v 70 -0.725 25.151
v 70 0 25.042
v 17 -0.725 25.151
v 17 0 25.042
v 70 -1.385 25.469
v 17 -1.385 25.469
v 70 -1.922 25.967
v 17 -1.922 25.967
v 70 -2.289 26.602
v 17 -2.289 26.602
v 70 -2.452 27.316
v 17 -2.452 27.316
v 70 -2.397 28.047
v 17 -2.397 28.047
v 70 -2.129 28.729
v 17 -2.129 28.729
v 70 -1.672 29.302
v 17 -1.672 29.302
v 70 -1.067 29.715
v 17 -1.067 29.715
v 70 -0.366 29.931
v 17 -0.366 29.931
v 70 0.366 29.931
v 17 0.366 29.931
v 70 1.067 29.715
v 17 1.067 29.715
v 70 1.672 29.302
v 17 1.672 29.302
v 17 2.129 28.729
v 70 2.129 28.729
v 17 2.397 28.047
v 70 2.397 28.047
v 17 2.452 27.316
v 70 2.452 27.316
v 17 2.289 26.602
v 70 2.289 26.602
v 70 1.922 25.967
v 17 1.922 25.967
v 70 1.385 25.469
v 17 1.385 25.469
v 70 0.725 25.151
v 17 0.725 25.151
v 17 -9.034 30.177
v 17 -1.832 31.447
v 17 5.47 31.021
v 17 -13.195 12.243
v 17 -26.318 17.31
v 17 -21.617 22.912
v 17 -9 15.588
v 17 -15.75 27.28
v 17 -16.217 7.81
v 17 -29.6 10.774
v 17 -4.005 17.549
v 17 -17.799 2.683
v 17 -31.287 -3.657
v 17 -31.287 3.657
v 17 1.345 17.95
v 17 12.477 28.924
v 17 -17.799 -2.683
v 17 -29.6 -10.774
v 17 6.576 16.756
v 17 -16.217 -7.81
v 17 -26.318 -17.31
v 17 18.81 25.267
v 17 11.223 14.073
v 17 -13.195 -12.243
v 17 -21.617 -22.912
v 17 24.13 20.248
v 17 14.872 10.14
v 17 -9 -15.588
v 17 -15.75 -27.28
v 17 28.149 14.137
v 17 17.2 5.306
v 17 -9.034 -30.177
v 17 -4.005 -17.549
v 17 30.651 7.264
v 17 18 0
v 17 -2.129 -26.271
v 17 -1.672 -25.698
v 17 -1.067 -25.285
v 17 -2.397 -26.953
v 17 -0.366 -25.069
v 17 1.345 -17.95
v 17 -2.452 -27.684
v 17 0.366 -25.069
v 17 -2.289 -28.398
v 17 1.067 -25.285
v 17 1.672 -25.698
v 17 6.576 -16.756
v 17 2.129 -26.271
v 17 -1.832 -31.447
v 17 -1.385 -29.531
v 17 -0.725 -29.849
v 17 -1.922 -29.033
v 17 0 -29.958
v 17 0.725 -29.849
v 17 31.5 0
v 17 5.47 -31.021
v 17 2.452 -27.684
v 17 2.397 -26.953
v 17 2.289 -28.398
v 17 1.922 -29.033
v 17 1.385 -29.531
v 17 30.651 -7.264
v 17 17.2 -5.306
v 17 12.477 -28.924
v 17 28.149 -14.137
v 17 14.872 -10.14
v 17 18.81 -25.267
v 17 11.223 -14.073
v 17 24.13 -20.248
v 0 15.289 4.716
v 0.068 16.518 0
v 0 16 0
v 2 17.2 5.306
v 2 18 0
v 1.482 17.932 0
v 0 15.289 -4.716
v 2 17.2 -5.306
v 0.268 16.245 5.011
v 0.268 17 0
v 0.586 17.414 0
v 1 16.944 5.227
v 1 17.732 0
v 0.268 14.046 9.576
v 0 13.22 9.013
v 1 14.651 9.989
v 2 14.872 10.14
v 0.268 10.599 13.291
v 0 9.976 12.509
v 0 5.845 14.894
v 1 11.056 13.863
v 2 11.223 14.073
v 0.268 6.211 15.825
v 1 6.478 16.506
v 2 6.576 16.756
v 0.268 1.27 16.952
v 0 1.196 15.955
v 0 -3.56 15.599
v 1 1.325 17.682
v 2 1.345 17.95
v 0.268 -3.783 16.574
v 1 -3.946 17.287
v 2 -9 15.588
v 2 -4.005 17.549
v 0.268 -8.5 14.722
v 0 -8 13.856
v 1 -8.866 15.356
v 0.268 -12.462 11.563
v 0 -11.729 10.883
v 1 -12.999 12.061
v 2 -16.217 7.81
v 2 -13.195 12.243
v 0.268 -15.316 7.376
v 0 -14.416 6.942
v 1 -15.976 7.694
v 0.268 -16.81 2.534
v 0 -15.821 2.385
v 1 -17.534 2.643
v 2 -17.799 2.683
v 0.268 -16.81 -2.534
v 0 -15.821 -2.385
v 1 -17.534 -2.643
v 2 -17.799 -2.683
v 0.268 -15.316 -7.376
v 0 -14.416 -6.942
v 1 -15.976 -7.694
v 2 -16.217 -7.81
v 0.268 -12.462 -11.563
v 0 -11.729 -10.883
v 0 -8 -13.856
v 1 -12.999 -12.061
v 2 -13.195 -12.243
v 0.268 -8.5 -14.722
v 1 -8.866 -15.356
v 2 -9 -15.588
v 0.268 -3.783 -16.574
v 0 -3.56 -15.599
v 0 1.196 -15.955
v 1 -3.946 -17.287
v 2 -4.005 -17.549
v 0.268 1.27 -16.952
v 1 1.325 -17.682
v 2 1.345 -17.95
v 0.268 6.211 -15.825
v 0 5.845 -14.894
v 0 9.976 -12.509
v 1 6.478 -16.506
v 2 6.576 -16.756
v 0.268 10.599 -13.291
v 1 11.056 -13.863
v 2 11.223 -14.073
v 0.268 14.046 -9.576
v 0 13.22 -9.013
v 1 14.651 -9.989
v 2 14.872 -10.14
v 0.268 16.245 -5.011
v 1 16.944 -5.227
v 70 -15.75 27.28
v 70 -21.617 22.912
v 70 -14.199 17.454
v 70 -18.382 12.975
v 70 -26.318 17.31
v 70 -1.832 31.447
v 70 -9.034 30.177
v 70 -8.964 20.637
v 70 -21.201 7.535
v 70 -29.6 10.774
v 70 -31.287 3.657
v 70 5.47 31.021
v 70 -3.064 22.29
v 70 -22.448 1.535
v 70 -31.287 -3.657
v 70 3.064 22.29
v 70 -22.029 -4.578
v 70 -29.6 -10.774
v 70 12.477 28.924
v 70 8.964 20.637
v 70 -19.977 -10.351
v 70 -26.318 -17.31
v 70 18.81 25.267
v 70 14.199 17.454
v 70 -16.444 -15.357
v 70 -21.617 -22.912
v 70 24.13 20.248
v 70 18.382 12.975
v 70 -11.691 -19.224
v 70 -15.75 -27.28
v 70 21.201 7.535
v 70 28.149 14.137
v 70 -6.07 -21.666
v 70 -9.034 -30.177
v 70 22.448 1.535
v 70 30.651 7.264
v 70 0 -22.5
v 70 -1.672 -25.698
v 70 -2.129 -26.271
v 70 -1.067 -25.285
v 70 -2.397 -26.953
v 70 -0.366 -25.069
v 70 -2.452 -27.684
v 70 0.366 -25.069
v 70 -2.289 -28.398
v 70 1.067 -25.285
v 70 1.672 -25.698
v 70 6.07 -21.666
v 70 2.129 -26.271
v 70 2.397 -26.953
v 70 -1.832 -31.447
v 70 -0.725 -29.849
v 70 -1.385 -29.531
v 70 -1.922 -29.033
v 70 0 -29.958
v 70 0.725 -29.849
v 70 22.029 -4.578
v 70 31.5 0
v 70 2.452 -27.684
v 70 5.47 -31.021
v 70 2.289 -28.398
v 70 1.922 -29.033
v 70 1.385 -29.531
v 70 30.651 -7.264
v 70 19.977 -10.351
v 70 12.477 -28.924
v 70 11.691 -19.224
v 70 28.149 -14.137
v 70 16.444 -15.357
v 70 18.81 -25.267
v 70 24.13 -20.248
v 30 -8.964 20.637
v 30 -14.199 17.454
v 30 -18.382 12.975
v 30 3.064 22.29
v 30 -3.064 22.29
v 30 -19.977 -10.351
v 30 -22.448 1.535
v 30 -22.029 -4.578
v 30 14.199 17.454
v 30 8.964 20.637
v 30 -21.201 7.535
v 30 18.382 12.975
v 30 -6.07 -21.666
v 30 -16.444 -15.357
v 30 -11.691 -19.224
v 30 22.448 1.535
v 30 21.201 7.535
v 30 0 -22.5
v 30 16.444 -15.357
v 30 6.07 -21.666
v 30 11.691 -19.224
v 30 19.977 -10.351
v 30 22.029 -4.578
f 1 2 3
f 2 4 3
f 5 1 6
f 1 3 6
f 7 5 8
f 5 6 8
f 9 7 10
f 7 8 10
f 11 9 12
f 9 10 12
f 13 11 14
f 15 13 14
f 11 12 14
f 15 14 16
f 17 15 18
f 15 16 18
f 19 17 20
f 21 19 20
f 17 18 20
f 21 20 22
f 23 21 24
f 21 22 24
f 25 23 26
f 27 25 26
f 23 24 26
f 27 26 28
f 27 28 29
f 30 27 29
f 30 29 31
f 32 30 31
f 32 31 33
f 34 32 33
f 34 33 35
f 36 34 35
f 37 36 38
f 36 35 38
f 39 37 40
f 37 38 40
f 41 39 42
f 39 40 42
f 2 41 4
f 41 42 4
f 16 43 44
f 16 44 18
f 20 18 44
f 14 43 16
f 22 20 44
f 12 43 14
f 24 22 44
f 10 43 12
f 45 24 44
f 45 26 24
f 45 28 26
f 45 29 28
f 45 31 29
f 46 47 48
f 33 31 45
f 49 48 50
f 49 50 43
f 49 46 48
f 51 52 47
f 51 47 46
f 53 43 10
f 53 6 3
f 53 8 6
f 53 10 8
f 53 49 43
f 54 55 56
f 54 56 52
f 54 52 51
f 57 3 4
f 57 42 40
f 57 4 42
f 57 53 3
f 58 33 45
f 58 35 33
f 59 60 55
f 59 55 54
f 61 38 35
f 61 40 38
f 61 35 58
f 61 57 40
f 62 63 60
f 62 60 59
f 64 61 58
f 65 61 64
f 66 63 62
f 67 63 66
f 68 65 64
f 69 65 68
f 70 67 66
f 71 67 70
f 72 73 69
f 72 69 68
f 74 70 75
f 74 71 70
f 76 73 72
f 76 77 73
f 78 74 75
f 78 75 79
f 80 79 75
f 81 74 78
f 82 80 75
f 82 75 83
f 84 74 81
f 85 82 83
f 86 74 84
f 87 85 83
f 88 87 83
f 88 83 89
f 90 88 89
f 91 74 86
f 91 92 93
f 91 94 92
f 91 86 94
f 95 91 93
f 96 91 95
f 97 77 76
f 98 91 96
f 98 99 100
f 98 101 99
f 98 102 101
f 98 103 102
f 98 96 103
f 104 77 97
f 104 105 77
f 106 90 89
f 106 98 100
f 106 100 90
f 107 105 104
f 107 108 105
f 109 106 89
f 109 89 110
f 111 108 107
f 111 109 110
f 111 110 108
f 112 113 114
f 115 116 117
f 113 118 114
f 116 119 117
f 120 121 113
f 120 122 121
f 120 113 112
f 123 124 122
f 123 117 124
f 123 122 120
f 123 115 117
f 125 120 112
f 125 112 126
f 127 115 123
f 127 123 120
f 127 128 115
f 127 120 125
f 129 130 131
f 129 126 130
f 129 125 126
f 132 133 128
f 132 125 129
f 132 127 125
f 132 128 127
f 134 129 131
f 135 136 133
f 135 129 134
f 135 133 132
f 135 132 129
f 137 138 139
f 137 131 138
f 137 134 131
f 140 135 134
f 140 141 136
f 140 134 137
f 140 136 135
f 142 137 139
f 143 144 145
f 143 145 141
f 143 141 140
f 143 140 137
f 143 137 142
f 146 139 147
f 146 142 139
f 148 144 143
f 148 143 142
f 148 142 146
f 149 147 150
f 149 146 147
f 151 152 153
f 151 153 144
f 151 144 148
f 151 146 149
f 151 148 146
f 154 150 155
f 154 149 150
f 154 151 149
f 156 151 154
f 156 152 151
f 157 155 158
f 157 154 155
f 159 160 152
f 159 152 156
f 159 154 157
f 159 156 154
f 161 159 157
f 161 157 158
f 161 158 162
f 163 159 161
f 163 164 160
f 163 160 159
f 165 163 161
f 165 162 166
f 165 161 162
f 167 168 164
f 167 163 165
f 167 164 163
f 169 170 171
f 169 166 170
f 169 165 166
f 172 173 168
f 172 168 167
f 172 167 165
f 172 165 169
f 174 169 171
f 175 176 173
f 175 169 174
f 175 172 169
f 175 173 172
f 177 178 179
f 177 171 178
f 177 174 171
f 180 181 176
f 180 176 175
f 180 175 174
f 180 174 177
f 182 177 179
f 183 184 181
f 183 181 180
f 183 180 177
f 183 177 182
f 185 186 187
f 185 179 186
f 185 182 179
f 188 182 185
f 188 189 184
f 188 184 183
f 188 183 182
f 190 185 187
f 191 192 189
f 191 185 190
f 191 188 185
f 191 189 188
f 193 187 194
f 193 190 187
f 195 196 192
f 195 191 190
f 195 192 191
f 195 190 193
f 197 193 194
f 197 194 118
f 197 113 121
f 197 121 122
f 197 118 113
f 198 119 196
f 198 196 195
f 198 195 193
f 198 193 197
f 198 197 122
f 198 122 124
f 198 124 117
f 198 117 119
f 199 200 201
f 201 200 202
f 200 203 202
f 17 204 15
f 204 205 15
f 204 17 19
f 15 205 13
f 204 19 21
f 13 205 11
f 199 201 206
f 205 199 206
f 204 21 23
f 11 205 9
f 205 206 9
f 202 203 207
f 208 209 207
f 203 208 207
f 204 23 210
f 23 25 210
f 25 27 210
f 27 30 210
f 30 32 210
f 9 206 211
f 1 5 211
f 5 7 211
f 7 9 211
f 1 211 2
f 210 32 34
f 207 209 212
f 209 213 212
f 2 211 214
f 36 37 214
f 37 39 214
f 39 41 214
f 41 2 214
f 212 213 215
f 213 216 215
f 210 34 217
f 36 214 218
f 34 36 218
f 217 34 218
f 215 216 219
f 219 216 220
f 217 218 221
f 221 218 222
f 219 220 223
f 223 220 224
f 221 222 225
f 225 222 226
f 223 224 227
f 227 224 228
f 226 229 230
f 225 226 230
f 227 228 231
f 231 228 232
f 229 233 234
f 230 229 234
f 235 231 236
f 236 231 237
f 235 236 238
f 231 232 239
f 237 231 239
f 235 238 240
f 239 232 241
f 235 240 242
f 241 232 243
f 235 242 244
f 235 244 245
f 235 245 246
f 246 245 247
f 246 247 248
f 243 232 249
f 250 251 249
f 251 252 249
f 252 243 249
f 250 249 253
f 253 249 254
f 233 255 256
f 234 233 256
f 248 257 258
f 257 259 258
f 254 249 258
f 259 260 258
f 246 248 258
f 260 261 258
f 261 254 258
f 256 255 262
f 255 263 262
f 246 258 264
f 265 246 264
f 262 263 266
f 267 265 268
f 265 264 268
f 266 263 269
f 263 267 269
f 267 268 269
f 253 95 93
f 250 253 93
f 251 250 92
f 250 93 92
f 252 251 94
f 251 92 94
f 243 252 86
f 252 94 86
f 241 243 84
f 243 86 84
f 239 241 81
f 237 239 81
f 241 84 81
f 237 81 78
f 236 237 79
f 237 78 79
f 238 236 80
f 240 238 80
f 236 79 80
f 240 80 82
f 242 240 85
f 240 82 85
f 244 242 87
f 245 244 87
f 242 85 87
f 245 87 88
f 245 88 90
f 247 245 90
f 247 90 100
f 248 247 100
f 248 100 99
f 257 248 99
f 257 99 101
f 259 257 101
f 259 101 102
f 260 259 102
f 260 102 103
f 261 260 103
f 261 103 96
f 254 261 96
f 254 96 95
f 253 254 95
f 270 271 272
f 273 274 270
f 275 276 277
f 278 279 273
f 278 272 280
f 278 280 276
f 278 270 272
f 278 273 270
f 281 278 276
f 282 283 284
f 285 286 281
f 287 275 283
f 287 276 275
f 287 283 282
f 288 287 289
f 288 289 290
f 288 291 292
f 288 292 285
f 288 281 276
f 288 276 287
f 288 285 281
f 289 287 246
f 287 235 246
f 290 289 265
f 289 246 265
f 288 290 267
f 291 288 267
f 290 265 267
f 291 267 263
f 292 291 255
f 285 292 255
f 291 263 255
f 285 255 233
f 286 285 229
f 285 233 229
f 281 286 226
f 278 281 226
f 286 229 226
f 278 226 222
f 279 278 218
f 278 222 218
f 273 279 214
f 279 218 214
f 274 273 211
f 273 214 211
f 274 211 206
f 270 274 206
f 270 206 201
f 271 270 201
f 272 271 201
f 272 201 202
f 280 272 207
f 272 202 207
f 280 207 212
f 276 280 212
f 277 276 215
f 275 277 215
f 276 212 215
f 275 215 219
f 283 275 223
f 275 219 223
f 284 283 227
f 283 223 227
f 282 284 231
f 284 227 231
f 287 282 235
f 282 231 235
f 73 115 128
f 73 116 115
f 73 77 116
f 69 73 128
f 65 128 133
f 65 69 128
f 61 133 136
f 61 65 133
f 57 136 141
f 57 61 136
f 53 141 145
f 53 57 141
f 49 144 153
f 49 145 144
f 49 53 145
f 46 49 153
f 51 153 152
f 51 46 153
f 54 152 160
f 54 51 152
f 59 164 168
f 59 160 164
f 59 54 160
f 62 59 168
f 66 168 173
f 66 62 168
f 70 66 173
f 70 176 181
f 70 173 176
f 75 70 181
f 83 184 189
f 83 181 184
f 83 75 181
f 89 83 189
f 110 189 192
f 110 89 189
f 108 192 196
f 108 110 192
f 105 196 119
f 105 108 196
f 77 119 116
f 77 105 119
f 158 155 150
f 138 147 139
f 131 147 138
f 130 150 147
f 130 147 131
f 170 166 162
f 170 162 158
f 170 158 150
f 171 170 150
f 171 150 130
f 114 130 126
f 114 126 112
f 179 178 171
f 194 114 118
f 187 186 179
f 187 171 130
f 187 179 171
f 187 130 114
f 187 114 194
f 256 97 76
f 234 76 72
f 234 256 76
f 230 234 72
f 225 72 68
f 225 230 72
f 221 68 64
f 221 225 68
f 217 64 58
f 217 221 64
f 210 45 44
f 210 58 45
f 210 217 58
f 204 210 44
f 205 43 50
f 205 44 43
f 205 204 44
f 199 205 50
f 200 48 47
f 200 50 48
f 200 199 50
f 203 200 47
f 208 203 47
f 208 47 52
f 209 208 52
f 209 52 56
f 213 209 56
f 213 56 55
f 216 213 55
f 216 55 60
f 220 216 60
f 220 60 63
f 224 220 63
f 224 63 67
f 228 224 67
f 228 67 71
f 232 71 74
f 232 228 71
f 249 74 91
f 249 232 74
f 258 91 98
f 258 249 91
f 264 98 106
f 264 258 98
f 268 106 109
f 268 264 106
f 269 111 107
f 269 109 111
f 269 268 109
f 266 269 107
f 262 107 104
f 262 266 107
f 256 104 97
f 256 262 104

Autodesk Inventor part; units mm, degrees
ref_plane "YZ Plane" through (0, 0, 0) normal (1, 0, 0) x (0, 1, 0)
ref_plane "XZ Plane" through (0, 0, 0) normal (0, 1, 0) x (-1, 0, 0)
ref_plane "XY Plane" through (0, 0, 0) normal (0, 0, 1) x (1, 0, 0)
sketch "Skizze1" plane through (0, 0, 0) normal (0, 0, 1) x (1, 0, 0)
  line L0 (0, 0) -> (0, 18)
  line L1 (0, 18) -> (17, 18)
  line L2 (17, 18) -> (17, 31.5)
  line L3 (17, 31.5) -> (70, 31.5)
  line L4 (70, 31.5) -> (70, 0)
  line L5 (70, 0) -> (0, 0)
  dimension "d0" = 70
  dimension "d1" = 36
  dimension "d2" = 17
  dimension "d3" = 63
revolve "Umdrehung1" add sketch "Skizze1" angle 360 about axis through (70, 0, 0) along (-1, 0, 0)
sketch "Skizze2" plane through (70, 0, 0) normal (1, 0, 0) x (0, 0, -1)
  circle A0 centre (0, 0) radius 22.5
  dimension "d5" = 45
extrude "Extrusion1" cut sketch "Skizze2" against normal blind 40
sketch "Skizze8" plane through (70, 0, 0) normal (1, 0, 0) x (0, 0, -1)
  line L0 (0, 0) -> (0, 31.8712) construction
  point P0 (-27.5, 0)
  point P1 (27.5, 0)
  dimension "d38" = 55
hole "Bohrung5" at (70, 0, 27.5) at (70, 0, -27.5) direction (-1, 0, 0) diameter 4.917 depth 53 thread size "M6x1" class "6H" standard "ISO Metric profile"
fillet "Rundung1" radius 2 1 edges at (0, -18, 0)
sketch "Skizze3" plane through (30, 0, 0) normal (1, 0, 0) x (0, 0, -1)
  line L0 (0, 0) -> (0, 13.1561) construction
  point P0 (-10, 0)
  point P1 (10, 0)
  dimension "d8" = 20
sketch "Skizze4" plane through (30, 0, 0) normal (1, 0, 0) x (0, 0, -1)
  circle A0 centre (10, 0) radius 2 projected
  point P0 (0, 0)
  point P1 (10, 0)
sketch "Skizze6" plane through (0, 0, 0) normal (-1, 0, 0) x (0, 0, 1)
  circle A0 centre (10, 0) radius 2 projected
  point P0 (0, 0)
  point P1 (10, 0)
sketch "Skizze5" plane through (0, 0, 0) normal (-1, 0, 0) x (0, 0, 1)
  circle A0 centre (-10, 0) radius 2 projected
  point P0 (0, 0)
  point P1 (-10, 0)
properties part number "Zylinder" material "Stahl, galvanisiert"
